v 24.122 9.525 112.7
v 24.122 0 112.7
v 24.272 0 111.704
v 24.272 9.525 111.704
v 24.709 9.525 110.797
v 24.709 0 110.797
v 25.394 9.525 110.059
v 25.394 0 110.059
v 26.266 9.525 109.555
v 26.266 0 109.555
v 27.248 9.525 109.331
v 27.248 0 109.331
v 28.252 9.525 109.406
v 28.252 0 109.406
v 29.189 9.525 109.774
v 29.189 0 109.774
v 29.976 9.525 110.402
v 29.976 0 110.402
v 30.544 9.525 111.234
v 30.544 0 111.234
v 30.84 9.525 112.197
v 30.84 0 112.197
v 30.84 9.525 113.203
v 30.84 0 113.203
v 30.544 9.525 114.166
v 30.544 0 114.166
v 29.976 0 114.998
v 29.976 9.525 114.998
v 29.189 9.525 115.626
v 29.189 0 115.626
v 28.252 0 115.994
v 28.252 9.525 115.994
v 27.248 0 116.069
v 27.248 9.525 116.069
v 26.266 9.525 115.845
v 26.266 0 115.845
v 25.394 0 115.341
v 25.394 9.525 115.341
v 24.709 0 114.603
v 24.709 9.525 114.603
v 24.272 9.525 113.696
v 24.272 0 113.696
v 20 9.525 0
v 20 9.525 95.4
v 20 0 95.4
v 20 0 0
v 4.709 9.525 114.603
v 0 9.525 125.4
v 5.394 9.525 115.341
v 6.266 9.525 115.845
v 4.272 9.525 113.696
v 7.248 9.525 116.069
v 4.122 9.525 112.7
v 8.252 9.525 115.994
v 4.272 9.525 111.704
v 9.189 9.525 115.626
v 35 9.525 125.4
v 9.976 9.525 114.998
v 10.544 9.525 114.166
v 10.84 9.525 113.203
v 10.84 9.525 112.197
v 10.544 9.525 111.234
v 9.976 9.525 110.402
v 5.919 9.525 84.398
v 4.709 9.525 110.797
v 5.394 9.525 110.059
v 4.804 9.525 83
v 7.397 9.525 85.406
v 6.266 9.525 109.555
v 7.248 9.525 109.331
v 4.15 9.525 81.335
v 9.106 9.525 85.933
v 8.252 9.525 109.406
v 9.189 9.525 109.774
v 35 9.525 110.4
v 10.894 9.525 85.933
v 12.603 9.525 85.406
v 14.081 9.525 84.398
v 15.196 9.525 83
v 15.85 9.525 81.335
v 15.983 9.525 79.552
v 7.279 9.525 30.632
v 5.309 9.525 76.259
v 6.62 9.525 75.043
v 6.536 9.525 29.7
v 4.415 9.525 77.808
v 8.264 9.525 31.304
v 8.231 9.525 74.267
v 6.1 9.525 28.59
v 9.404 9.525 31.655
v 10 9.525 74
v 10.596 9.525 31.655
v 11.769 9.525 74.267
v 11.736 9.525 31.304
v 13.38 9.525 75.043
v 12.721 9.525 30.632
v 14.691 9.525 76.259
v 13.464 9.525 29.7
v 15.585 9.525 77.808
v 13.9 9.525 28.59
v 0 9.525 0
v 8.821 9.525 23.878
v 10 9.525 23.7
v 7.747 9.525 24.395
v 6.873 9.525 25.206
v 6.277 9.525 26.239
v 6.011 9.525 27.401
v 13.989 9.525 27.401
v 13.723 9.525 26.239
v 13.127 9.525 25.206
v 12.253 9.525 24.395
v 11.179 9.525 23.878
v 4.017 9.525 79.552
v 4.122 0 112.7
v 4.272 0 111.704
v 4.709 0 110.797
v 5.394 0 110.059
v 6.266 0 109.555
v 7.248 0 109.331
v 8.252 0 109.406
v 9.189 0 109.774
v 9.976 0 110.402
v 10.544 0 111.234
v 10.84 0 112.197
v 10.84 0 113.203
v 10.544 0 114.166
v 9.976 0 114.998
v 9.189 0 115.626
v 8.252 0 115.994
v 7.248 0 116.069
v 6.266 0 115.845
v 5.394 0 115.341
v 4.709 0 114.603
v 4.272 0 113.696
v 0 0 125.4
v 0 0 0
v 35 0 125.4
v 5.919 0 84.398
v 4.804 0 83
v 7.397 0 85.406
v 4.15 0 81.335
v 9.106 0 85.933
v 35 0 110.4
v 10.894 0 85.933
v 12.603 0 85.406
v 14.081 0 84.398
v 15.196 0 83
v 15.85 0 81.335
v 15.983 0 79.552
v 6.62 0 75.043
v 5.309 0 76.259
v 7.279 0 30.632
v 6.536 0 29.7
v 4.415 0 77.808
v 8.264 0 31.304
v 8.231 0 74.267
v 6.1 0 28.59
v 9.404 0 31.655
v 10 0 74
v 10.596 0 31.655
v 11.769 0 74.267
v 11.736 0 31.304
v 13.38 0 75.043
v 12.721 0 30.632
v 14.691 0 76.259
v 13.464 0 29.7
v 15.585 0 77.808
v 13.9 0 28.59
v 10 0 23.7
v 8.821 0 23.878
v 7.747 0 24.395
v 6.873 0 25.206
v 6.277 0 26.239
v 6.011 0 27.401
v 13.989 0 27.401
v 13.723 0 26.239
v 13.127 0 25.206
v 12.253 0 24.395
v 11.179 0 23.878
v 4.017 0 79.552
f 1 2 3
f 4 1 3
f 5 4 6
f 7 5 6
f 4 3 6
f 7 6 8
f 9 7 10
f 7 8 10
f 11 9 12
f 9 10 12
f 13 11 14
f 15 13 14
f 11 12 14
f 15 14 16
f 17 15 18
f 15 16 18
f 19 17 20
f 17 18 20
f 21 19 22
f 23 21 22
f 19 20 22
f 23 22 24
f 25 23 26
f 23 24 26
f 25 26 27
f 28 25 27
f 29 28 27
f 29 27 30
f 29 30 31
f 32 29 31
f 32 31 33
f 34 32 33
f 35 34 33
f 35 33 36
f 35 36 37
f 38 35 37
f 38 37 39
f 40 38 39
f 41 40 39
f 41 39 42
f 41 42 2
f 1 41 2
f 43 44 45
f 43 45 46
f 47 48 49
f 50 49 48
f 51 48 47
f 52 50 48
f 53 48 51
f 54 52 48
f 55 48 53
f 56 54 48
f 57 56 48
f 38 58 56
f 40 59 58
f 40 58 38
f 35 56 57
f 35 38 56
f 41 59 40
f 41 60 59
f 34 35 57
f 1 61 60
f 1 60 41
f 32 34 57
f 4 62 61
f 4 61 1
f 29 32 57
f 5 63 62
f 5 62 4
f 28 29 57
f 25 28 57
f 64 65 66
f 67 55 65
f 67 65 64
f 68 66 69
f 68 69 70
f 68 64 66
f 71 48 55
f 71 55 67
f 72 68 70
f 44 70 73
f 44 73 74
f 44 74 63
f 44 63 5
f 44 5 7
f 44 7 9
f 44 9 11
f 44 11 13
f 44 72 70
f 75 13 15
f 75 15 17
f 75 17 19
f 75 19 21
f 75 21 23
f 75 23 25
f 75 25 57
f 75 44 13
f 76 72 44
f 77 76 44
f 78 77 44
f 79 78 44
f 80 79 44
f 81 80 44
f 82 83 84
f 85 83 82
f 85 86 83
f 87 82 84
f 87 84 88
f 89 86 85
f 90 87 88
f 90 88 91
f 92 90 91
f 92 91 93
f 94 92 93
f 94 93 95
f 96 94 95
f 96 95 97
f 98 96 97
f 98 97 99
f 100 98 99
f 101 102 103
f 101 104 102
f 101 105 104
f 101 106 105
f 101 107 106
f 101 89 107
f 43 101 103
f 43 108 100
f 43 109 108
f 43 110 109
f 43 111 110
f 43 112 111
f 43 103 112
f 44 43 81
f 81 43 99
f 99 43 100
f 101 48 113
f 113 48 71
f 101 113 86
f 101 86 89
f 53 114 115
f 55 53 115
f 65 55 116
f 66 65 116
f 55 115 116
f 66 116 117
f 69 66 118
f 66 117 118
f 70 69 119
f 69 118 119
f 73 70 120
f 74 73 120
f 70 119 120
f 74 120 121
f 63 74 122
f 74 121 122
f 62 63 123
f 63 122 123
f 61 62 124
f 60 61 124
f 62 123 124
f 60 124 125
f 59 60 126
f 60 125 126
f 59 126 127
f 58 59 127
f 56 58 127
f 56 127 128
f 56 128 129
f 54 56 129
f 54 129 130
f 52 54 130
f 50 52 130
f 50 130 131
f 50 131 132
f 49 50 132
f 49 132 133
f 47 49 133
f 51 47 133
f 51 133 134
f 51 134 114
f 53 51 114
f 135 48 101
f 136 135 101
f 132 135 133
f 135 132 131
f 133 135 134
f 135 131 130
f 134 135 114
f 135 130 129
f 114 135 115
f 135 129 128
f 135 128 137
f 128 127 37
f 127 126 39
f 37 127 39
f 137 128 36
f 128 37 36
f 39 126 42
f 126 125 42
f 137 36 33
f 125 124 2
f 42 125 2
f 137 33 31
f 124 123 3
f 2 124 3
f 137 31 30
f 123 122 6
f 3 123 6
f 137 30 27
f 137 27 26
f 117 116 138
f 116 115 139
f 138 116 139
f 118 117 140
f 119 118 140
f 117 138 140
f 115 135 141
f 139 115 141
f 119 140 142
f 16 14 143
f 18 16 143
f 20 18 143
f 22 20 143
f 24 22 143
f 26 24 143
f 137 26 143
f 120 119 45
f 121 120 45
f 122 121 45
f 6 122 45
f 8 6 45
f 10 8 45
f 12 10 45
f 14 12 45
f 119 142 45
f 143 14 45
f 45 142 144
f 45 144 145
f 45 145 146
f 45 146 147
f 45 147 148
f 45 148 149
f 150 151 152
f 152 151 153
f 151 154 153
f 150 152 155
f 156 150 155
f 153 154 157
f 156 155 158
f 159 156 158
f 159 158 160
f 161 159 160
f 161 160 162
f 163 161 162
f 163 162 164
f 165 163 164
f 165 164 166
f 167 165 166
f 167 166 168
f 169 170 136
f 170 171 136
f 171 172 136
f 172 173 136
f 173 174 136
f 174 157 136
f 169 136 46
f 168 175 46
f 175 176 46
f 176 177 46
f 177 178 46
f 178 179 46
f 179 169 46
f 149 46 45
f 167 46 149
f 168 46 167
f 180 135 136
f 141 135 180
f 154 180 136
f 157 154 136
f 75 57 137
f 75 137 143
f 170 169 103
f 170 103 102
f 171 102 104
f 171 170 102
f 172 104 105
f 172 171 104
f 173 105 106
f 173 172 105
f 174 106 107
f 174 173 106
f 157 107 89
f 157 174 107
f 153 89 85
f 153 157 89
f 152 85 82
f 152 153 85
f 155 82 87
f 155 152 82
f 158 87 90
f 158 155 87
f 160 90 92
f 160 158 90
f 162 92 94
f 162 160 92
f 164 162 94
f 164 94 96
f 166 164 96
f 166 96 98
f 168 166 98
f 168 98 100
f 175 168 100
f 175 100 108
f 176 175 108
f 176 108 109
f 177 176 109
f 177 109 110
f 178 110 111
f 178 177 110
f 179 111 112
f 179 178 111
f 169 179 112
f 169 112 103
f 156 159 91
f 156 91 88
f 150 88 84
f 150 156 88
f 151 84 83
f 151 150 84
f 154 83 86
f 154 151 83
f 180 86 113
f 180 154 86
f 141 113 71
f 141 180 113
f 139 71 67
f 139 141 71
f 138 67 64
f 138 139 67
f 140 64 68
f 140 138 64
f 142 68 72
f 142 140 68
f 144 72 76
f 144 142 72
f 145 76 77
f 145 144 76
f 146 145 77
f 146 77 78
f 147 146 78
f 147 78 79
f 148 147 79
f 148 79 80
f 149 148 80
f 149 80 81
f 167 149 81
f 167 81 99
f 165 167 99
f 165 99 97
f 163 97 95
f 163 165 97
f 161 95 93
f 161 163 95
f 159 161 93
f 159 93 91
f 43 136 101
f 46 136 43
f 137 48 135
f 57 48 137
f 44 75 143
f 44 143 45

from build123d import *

# Parameters (mm, degrees)
SKETCH2_W               = 20
SKETCH2_H               = 100
SKETCH2_R               = 6
SKETCH2_R_2             = 4
BOSS_EXTRUDE1_DEPTH     = 9.525
SKETCH4_W               = 20
SKETCH4_H               = 25.4
BOSS_EXTRUDE2_DEPTH     = 9.525
BOSS_EXTRUDE3_DEPTH     = 9.525
F_1_4_CLEARANCE_HOLE2_D = 6.7564


with BuildPart() as part:
    # Sketch2 → Boss-Extrude1 (new body)
    with BuildSketch(Plane(origin=(0, 0, 0), x_dir=(1, 0, 0), z_dir=(0, 1, 0))):
        with Locations((10, -50)):
            Rectangle(SKETCH2_W, SKETCH2_H)
        with Locations(Location((10, -80, 0), (0, 0, 90))):
            Circle(SKETCH2_R, mode=Mode.SUBTRACT)
        with Locations(Location((10, -27.7, 0), (0, 0, 90))):
            Circle(SKETCH2_R_2, mode=Mode.SUBTRACT)
    extrude(amount=BOSS_EXTRUDE1_DEPTH)

    # Sketch4 → Boss-Extrude2 (add)
    with BuildSketch(Plane(origin=(0, 9.525, 0), x_dir=(1, 0, 0), z_dir=(0, 1, 0))):
        with Locations((10, -112.7)):
            Rectangle(SKETCH4_W, SKETCH4_H)
    extrude(amount=-BOSS_EXTRUDE2_DEPTH)

    # Sketch8 → Boss-Extrude3 (add)
    with BuildSketch(Plane(origin=(0, 9.525, 0), x_dir=(1, 0, 0), z_dir=(0, 1, 0))):
        Polygon((20, -125.4), (35, -125.4), (35, -110.4), (20, -95.4), align=None)
    extrude(amount=-BOSS_EXTRUDE3_DEPTH)

    # 1/4 Clearance Hole2 (through all)
    with Locations(Plane(origin=(0, 9.525, 0), x_dir=(1, 0, 0), z_dir=(0, 1, 0))):
        with Locations((7.5, -112.7), (27.5, -112.7)):
            Hole(F_1_4_CLEARANCE_HOLE2_D / 2)


solid = part.part
